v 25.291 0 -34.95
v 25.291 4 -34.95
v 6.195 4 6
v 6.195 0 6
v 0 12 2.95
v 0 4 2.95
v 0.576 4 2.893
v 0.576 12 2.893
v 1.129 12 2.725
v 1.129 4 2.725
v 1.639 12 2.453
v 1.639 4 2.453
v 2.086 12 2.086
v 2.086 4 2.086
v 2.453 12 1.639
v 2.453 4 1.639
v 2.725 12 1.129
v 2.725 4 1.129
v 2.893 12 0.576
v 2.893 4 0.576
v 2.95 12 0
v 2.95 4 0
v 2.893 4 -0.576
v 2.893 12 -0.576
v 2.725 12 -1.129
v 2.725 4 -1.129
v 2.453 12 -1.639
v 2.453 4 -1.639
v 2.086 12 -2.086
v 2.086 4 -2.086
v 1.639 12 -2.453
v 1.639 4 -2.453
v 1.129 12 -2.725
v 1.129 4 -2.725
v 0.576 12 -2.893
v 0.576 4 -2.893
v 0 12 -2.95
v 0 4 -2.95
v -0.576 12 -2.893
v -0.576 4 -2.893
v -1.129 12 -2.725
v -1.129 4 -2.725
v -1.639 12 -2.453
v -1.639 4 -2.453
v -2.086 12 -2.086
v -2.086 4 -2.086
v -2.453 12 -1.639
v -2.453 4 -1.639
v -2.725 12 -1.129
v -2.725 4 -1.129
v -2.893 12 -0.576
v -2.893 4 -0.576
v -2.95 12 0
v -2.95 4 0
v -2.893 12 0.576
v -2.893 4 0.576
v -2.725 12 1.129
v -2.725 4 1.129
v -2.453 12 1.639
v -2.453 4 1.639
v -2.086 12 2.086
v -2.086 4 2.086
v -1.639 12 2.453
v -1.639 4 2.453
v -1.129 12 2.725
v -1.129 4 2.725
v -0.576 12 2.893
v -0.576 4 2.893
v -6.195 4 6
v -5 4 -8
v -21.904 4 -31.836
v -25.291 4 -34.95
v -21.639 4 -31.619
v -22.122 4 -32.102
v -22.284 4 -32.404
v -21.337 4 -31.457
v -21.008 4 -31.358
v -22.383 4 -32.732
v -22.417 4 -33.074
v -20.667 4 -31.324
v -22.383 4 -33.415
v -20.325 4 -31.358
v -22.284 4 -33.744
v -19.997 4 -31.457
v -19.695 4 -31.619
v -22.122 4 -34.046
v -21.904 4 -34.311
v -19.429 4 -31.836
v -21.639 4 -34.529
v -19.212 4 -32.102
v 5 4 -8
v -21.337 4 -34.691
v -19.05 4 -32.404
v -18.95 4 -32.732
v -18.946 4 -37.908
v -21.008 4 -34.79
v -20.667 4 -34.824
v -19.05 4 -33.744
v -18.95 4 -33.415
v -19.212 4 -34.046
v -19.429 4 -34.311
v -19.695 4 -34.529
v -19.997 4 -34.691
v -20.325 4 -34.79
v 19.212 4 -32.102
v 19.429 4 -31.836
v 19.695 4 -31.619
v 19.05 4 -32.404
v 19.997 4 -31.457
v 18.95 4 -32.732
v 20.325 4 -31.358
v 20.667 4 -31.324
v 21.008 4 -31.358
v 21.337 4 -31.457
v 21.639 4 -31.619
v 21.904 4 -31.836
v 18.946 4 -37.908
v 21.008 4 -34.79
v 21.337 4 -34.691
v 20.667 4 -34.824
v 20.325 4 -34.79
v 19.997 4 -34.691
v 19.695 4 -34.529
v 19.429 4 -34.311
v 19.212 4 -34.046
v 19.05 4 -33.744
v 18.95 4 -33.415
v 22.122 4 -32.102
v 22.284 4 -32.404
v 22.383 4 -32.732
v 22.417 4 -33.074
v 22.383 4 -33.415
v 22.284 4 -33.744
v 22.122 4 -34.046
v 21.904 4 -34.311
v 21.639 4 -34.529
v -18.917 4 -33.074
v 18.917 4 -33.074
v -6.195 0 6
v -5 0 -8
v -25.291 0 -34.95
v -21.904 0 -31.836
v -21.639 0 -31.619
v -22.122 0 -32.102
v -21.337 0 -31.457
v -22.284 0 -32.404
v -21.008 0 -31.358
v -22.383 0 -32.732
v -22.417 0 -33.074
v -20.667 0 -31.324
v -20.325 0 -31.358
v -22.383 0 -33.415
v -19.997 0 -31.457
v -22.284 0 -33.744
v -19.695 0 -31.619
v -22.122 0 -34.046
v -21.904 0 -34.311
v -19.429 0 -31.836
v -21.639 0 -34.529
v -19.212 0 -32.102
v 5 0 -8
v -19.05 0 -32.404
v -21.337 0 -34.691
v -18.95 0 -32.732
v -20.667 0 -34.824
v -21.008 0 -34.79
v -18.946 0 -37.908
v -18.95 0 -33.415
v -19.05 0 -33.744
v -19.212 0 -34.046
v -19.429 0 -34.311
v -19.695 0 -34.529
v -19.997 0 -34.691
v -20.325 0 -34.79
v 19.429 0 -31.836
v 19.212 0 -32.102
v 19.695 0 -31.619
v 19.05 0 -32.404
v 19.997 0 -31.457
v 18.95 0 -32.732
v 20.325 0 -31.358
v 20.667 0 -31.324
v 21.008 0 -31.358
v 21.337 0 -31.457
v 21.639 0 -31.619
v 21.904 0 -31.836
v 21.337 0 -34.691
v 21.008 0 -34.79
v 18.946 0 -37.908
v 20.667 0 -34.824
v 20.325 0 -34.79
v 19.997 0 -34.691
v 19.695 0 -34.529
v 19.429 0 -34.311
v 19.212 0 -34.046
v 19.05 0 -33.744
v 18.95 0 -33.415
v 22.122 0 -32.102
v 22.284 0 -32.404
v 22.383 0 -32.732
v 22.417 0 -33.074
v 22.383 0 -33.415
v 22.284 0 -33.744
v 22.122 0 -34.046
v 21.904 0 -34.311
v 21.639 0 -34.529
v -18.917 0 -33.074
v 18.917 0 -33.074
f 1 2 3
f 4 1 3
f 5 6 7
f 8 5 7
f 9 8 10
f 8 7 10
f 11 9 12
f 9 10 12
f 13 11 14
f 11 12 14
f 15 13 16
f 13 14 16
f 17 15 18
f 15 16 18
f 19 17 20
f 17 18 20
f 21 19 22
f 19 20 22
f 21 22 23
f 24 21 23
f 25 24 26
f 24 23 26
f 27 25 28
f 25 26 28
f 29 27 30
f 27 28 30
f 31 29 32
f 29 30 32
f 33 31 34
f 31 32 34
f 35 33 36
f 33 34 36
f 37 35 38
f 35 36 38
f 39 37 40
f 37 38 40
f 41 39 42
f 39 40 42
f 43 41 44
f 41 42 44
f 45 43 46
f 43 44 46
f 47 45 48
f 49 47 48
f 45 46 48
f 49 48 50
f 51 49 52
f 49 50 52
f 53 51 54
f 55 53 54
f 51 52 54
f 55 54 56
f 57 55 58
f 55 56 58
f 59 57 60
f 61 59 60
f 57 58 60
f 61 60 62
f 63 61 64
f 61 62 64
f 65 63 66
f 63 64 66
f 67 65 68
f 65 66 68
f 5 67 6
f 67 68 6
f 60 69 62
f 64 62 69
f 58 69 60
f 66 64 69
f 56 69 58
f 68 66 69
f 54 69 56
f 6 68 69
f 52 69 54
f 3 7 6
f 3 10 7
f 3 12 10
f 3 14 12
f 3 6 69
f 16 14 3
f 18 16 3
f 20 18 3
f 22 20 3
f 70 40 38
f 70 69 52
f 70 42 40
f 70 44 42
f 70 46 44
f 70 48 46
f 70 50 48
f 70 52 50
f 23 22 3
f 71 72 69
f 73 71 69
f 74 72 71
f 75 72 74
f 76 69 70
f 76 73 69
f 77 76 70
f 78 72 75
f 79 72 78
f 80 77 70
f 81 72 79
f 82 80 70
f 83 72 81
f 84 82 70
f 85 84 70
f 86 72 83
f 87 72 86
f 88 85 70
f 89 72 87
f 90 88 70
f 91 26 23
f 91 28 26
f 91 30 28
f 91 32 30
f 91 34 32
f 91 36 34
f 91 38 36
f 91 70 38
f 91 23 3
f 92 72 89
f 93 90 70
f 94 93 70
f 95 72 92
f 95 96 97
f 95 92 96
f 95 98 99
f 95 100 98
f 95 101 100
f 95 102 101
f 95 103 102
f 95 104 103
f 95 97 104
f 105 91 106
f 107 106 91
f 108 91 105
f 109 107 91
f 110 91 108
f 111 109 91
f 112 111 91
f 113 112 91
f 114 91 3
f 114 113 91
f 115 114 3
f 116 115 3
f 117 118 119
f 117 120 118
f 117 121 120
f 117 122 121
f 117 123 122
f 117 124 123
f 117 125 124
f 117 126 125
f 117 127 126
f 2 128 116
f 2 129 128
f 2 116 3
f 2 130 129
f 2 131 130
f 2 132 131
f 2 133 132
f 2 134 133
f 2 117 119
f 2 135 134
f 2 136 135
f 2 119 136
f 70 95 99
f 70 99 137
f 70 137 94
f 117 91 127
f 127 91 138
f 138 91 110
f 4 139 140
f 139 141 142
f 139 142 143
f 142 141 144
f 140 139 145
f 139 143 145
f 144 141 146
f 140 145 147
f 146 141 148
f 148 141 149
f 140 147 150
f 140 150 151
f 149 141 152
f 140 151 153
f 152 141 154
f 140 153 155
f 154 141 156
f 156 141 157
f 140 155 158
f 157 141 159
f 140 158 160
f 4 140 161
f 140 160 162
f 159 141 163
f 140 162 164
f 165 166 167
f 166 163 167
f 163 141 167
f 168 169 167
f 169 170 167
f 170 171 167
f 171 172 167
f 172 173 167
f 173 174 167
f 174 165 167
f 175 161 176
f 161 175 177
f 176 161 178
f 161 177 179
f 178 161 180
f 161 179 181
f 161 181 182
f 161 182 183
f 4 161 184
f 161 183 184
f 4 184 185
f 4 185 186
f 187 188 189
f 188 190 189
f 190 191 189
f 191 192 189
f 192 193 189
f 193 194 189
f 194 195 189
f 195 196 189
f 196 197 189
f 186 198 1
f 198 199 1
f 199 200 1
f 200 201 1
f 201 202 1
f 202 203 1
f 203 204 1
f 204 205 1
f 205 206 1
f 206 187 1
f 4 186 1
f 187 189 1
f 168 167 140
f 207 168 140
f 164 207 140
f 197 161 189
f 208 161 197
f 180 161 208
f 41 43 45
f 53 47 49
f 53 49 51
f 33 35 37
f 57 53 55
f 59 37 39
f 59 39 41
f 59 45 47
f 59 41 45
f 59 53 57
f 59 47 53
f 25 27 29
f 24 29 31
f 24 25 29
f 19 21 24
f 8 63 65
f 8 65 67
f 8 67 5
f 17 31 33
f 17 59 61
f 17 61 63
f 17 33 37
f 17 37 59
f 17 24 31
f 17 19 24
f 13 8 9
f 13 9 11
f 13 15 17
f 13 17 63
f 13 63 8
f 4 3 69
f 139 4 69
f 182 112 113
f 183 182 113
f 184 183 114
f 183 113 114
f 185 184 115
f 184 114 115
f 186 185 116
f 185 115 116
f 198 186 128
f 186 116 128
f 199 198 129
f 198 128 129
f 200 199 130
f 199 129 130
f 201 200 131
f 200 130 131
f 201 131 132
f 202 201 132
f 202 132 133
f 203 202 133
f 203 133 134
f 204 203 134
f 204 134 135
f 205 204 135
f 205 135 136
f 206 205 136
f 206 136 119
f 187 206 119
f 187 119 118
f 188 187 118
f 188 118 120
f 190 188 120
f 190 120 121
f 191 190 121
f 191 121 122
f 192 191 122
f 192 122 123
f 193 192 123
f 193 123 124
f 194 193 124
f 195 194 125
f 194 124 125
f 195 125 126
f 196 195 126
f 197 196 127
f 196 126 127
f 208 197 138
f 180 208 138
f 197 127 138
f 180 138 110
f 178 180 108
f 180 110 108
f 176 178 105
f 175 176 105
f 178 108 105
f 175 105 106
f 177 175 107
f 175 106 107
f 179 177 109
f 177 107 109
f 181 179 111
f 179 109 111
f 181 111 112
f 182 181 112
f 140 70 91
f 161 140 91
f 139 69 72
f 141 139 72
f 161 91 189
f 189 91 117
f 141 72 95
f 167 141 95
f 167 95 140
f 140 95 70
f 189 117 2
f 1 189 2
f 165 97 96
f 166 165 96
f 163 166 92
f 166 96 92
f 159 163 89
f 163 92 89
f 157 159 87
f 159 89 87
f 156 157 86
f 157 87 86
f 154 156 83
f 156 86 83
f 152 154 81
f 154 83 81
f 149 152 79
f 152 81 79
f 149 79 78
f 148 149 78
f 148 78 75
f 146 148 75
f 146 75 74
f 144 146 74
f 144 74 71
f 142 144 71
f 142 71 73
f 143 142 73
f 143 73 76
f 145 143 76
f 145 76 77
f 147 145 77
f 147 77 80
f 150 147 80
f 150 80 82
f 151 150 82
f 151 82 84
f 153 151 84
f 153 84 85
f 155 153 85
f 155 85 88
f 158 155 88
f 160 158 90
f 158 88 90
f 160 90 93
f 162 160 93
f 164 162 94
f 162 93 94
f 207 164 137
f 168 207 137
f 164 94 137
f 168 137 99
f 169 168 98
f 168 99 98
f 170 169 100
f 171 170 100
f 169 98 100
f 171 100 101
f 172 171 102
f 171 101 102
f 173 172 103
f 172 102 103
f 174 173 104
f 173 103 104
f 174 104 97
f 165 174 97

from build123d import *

# Parameters (mm, degrees)
SKETCH1_W           = 80
SKETCH1_H           = 80
BOSS_EXTRUDE1_DEPTH = 4
CUT_EXTRUDE2_REACH  = 58.71
SKETCH3_R           = 1.75
SKETCH4_W           = 80
SKETCH4_H           = 80
CUT_EXTRUDE3_DEPTH  = 4
SKETCH2_R           = 2.95
BOSS_EXTRUDE2_DEPTH = 8


with BuildPart() as part:
    # Sketch1 → Boss-Extrude1 (new body)
    with BuildSketch(Plane(origin=(0, 0, 0), x_dir=(1, 0, 0), z_dir=(0, 1, 0))):
        Rectangle(SKETCH1_W, SKETCH1_H)
    extrude(amount=BOSS_EXTRUDE1_DEPTH)

    # Sketch3 → Cut-Extrude2 (cut, up to next)
    with BuildSketch(Plane(origin=(0, 4, 0), x_dir=(1, 0, 0), z_dir=(0, 1, 0)), mode=Mode.PRIVATE) as cut_extrude2_sk1:
        with Locations(Location((20.666851305, 33.07387575, 0), (0, 0, 270))):
            Circle(SKETCH3_R)
    cut_extrude2_tool1 = extrude(cut_extrude2_sk1.sketch, amount=-CUT_EXTRUDE2_REACH, mode=Mode.PRIVATE) & part.part
    # Sketch3 → Cut-Extrude2 (cut, up to next)
    with BuildSketch(Plane(origin=(0, 4, 0), x_dir=(1, 0, 0), z_dir=(0, 1, 0)), mode=Mode.PRIVATE) as cut_extrude2_sk2:
        with Locations(Location((-20.666851305, 33.07387575, 0), (0, 0, 90))):
            Circle(SKETCH3_R)
    cut_extrude2_tool2 = extrude(cut_extrude2_sk2.sketch, amount=-CUT_EXTRUDE2_REACH, mode=Mode.PRIVATE) & part.part
    add(cut_extrude2_tool1.solids().sort_by_distance((20.666851, 4, -33.073876))[0], mode=Mode.SUBTRACT)
    add(cut_extrude2_tool2.solids().sort_by_distance((-20.666851, 4, -33.073876))[0], mode=Mode.SUBTRACT)

    # Sketch4 → Cut-Extrude3 (cut)
    with BuildSketch(Plane(origin=(0, 4, 0), x_dir=(1, 0, 0), z_dir=(0, 1, 0))):
        Rectangle(SKETCH4_W, SKETCH4_H)
        Polygon((5, 8), (18.946402637, 37.908156972), (25.290557147, 34.94982914), (6.195338219, -6), (0, -6), (-6.195338219, -6), (-25.290557147, 34.94982914), (-18.946402637, 37.908156972), (-5, 8), (0, 8), align=None, mode=Mode.SUBTRACT)
    extrude(amount=-CUT_EXTRUDE3_DEPTH, mode=Mode.SUBTRACT)

    # Sketch2 → Boss-Extrude2 (add)
    with BuildSketch(Plane(origin=(0, 4, 0), x_dir=(1, 0, 0), z_dir=(0, 1, 0))):
        with Locations(Location((0, 0, 0), (0, 0, 270))):
            Circle(SKETCH2_R)
    extrude(amount=BOSS_EXTRUDE2_DEPTH)


solid = part.part
